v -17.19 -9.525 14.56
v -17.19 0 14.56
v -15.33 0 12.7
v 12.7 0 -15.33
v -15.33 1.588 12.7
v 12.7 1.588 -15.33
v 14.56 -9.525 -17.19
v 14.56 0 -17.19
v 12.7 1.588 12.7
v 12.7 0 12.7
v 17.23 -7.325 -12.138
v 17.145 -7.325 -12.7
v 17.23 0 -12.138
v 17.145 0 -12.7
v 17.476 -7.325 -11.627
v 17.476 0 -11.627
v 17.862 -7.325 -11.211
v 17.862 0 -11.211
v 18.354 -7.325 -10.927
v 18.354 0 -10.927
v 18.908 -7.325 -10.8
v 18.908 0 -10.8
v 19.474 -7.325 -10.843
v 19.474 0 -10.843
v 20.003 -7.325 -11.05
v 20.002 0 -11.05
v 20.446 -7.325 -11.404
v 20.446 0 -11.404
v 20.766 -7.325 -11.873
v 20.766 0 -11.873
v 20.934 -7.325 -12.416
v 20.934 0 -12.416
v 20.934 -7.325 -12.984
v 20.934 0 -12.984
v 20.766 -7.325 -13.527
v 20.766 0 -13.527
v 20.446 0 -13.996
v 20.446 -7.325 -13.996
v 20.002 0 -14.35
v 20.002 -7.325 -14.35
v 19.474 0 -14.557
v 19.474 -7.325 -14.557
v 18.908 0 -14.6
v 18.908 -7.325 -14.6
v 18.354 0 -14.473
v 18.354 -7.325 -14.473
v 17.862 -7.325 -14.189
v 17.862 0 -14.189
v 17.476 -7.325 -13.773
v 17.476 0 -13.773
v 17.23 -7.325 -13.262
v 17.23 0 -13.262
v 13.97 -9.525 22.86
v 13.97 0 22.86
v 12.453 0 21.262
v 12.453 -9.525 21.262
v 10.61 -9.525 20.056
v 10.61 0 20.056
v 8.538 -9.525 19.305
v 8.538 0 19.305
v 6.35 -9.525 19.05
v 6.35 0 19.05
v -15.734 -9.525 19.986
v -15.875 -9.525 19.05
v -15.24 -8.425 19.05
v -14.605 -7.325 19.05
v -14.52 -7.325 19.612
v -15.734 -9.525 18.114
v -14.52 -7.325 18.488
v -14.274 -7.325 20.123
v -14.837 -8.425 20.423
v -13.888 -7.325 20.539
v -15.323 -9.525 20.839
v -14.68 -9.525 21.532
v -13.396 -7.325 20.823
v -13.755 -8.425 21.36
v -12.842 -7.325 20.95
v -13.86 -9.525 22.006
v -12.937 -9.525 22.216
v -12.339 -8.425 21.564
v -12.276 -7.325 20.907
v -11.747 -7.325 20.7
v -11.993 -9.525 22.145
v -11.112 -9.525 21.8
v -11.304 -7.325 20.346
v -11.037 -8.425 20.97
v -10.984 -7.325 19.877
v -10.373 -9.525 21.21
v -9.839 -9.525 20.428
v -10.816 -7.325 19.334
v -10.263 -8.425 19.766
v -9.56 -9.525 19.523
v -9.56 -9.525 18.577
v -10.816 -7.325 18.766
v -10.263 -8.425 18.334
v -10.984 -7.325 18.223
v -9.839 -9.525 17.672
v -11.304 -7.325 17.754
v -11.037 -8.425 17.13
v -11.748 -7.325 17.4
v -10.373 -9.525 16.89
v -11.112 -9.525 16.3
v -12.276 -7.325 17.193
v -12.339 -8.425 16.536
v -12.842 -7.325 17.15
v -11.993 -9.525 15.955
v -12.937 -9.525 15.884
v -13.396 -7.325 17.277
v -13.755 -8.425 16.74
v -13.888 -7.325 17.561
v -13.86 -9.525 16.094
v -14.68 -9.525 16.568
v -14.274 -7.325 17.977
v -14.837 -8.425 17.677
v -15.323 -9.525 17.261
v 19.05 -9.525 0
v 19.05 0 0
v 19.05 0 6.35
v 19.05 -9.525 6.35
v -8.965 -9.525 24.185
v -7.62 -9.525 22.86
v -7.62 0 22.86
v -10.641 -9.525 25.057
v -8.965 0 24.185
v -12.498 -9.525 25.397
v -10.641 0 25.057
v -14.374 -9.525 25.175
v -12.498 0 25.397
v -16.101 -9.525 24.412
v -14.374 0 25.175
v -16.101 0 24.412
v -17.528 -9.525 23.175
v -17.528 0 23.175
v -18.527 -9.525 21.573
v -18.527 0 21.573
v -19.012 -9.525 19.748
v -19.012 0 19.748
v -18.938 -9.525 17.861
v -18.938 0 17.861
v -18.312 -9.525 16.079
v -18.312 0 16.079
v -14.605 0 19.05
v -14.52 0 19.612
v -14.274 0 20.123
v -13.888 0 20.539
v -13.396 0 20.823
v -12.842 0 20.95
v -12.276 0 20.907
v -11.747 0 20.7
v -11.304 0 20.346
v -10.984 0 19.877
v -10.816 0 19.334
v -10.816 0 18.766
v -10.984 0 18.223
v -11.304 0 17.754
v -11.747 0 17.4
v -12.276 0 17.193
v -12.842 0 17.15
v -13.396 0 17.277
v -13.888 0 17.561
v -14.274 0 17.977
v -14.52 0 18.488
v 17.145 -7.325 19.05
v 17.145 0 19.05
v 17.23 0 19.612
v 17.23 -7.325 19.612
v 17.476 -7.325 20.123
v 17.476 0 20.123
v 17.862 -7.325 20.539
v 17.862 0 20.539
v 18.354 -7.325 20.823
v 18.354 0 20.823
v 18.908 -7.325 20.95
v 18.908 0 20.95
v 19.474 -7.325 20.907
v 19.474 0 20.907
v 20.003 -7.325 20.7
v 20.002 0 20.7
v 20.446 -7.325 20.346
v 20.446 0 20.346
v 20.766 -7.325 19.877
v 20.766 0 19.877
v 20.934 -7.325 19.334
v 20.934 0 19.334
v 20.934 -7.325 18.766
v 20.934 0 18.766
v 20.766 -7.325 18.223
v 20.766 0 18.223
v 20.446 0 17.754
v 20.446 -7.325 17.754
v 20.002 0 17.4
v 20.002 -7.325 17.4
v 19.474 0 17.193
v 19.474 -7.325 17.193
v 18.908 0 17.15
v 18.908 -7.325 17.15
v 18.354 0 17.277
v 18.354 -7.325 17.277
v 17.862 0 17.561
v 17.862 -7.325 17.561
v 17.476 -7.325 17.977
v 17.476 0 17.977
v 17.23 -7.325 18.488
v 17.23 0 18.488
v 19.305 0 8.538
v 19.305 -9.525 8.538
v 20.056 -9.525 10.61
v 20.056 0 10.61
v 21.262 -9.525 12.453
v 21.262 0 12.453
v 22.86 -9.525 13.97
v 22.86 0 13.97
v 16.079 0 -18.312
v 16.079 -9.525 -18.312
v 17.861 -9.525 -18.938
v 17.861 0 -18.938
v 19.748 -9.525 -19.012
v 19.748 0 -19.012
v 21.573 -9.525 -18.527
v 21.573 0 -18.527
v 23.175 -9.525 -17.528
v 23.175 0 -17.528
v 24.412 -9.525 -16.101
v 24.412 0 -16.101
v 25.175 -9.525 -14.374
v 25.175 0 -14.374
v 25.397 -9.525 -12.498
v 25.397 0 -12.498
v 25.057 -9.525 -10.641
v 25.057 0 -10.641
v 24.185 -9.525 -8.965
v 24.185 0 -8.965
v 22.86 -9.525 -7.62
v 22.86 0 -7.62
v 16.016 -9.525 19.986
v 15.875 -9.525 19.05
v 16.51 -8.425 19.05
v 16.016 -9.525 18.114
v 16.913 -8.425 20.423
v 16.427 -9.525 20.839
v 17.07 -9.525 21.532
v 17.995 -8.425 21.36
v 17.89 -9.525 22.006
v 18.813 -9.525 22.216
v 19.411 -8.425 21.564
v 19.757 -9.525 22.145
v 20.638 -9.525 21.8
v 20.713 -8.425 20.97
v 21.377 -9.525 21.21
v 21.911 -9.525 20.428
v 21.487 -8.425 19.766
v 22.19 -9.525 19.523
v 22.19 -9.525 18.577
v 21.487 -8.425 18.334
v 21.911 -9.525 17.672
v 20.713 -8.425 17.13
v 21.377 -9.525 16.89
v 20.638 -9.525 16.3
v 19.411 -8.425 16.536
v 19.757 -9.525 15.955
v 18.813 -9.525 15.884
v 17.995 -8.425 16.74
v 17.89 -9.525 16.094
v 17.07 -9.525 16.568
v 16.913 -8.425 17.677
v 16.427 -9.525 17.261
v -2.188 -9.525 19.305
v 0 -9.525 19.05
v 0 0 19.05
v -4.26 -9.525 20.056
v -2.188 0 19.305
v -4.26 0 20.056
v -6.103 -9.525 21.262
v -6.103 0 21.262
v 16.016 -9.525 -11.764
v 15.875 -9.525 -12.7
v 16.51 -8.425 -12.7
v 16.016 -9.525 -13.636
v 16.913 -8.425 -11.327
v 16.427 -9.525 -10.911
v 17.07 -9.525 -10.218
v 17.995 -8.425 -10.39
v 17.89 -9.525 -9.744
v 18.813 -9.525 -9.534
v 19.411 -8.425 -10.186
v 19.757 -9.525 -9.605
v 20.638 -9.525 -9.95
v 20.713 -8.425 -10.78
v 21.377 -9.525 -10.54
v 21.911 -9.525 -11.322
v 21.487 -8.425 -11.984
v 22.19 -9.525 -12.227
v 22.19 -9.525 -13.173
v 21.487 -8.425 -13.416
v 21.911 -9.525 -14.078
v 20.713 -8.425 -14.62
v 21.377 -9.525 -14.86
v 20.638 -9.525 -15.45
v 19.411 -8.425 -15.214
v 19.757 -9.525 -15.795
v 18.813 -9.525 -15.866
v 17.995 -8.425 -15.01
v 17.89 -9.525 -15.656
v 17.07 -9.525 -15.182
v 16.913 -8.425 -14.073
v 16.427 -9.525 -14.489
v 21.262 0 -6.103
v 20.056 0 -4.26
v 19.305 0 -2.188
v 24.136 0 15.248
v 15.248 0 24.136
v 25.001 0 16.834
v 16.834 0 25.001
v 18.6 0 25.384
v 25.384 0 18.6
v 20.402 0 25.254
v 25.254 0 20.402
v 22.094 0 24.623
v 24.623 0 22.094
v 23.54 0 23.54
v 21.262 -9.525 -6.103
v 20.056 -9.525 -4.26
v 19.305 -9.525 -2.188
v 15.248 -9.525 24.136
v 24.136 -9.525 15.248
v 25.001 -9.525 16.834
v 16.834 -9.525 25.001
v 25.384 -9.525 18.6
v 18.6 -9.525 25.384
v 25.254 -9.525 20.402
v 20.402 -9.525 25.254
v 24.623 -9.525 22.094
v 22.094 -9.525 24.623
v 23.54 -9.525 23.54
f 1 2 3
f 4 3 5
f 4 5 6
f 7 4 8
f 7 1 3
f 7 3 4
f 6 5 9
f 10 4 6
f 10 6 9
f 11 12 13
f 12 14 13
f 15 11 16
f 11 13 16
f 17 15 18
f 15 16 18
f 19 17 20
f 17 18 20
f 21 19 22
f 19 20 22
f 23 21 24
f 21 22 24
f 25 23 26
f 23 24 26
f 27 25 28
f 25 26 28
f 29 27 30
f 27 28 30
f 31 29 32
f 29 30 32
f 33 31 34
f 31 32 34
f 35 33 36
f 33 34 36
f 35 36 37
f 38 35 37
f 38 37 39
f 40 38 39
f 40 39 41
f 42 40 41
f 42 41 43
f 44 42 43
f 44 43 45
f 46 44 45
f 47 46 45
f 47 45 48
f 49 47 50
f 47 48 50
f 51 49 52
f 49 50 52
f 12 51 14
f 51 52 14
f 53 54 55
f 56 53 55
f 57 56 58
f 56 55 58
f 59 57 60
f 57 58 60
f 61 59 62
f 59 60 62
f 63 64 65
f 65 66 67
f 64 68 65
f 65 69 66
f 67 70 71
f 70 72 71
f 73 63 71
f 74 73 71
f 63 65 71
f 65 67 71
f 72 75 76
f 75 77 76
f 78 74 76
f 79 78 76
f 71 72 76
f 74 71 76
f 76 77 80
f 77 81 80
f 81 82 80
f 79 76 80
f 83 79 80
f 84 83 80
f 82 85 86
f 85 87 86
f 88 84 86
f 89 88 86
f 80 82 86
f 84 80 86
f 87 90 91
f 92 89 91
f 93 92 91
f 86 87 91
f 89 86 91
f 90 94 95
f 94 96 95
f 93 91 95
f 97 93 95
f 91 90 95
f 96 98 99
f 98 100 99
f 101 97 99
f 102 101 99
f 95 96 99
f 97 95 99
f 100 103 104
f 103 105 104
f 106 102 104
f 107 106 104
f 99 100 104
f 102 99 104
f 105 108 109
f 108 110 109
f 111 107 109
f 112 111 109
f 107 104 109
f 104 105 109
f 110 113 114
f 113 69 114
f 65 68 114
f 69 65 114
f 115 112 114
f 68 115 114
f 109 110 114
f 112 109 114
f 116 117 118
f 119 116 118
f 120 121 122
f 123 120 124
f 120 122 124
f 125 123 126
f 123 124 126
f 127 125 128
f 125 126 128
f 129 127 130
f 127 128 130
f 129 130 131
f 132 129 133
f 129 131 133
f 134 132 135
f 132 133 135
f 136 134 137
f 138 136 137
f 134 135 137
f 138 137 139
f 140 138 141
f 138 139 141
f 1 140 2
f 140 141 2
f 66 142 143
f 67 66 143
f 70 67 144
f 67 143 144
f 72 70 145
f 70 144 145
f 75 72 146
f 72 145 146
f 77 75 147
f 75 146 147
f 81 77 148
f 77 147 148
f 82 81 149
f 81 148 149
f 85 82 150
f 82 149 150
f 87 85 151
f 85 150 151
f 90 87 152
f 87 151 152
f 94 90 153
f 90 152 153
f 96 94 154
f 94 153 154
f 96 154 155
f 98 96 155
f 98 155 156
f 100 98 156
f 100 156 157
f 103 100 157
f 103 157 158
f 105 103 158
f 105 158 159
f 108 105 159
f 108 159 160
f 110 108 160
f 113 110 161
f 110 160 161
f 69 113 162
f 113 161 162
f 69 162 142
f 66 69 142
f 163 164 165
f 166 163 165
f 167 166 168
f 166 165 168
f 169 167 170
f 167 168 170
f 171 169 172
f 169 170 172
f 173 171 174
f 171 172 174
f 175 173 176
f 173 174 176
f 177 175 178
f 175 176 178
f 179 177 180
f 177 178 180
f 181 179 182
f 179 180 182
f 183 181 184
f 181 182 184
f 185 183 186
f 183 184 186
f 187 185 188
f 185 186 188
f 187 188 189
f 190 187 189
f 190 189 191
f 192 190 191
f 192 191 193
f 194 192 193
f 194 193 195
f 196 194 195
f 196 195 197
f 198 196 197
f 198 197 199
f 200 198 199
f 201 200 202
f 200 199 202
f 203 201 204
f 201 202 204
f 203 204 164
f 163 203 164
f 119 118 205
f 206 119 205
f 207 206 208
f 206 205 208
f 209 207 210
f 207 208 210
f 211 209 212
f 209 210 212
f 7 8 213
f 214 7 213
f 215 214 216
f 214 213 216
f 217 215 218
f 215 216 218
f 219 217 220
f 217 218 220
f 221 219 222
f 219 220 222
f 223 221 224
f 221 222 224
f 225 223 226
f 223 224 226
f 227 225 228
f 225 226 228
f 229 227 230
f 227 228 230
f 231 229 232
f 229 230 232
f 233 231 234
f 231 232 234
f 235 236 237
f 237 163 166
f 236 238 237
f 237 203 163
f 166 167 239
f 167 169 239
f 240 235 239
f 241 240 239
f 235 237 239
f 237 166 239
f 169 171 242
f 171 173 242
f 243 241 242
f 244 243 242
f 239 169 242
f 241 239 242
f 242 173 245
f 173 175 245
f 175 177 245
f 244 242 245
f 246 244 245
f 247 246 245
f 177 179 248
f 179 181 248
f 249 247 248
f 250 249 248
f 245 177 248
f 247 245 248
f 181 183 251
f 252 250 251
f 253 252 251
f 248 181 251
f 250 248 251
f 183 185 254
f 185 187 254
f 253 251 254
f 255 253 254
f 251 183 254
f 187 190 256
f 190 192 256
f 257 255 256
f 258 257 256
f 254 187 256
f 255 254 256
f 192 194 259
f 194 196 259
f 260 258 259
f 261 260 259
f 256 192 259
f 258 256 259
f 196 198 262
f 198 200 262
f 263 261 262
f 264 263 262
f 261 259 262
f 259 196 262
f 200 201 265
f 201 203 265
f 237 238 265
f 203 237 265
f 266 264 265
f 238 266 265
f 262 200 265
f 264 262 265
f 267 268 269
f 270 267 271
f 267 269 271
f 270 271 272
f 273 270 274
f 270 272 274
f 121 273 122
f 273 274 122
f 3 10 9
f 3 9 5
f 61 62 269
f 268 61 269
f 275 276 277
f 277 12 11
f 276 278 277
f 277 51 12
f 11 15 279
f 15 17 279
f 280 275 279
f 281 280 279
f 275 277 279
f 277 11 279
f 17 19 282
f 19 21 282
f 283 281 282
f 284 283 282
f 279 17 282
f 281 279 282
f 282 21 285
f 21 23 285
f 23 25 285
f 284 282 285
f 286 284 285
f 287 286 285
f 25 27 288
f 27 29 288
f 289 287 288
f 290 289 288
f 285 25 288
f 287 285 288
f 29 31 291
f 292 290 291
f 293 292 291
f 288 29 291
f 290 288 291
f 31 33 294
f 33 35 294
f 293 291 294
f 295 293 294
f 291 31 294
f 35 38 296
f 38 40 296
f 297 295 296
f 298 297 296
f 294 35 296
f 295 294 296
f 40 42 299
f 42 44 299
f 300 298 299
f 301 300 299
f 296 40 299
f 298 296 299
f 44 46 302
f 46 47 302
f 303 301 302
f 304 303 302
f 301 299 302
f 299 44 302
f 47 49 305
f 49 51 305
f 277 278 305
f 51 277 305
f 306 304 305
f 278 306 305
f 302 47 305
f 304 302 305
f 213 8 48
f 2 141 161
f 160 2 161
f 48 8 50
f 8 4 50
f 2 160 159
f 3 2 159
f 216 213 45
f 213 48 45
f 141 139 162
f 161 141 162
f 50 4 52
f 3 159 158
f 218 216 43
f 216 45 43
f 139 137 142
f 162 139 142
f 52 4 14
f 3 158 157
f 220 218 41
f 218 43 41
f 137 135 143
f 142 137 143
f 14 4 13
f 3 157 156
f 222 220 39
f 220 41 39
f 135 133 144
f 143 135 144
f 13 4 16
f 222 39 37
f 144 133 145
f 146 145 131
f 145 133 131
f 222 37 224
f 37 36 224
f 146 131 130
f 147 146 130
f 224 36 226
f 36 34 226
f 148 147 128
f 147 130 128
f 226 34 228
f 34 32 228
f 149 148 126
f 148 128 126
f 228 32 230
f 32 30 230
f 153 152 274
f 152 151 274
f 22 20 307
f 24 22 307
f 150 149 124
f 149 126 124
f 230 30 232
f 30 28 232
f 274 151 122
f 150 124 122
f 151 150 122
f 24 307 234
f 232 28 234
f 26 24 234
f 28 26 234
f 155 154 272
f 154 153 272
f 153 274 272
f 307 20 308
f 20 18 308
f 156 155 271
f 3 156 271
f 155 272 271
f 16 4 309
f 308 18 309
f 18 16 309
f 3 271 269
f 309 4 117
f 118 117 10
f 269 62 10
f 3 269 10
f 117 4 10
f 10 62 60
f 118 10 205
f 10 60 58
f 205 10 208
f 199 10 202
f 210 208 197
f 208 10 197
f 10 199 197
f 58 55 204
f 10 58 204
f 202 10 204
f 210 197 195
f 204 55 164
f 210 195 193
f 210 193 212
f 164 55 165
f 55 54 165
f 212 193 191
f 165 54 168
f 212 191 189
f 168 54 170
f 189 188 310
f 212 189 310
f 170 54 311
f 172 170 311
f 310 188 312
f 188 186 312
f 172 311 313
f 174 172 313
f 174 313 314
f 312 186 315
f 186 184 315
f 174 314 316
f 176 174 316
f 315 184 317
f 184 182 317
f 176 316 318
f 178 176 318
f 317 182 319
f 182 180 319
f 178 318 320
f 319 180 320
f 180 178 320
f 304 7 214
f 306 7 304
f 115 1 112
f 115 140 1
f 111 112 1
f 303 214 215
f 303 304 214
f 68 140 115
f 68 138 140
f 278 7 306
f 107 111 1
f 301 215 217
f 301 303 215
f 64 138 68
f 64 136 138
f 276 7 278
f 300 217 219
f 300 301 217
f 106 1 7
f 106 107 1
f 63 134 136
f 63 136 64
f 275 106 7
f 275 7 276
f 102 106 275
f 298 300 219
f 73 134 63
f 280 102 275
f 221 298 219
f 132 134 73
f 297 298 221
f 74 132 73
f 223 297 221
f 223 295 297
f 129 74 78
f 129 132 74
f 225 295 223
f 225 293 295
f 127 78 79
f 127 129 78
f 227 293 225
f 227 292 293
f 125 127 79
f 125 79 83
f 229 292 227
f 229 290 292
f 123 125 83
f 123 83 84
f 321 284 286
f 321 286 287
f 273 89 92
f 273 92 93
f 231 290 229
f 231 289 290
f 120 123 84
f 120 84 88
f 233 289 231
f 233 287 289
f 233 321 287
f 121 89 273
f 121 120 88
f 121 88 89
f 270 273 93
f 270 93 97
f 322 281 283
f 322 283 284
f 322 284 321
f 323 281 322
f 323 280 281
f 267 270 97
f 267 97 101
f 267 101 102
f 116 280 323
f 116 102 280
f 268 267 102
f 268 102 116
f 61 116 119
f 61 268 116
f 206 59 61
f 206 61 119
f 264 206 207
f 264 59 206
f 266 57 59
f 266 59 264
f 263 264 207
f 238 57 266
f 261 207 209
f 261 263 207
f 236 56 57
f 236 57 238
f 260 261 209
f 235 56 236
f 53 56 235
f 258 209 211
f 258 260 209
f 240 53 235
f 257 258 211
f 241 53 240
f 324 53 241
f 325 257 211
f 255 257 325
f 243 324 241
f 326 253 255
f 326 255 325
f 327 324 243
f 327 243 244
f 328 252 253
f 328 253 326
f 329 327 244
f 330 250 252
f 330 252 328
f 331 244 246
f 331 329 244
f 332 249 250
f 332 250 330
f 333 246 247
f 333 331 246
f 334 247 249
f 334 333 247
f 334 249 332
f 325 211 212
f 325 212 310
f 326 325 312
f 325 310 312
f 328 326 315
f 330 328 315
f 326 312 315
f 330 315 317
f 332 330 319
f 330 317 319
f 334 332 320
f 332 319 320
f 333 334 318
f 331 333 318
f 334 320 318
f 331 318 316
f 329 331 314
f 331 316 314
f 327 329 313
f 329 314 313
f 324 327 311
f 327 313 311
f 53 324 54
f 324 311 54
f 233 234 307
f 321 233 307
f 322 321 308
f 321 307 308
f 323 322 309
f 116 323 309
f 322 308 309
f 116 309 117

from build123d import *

# Parameters (mm, degrees)
F1_DEPTH       = 9.525
F3_D           = 3.81
F3_CSINK_D     = 6.35
F3_CSINK_ANGLE = 60
F5_DEPTH       = 9.525
F5_DEPTH_BACK  = 1.5875
F7_DEPTH       = 25.4


with BuildPart() as f1:
    # F0 (on Front) → F1 (new body)
    with BuildSketch(Plane.XZ):
        with BuildLine():
            ThreePointArc((0, 19.05), (-4.259709, 20.055581), (-7.62, 22.86))
            ThreePointArc((-7.62, 22.86), (-18.379613, 21.889806), (-12.7, 12.7))
            Line((-12.7, 12.7), (12.7, 12.7))
            Line((12.7, 12.7), (12.7, -12.7))
            ThreePointArc((12.7, -12.7), (21.889806, -18.379613), (22.86, -7.62))
            ThreePointArc((22.86, -7.62), (20.055581, -4.259709), (19.05, 0))
            Line((19.05, 0), (19.05, 6.35))
            ThreePointArc((19.05, 6.35), (20.055581, 10.609709), (22.86, 13.97))
            ThreePointArc((22.86, 13.97), (23.540128, 23.540128), (13.97, 22.86))
            ThreePointArc((13.97, 22.86), (10.609709, 20.055581), (6.35, 19.05))
            Line((6.35, 19.05), (0, 19.05))
        make_face()
    extrude(amount=F1_DEPTH)

    # F3 (through all)
    with Locations(Plane.XZ.offset(9.525)):
        with Locations((-12.7, 19.05), (19.05, 19.05), (19.05, -12.7)):
            CounterSinkHole(F3_D / 2, F3_CSINK_D / 2, counter_sink_angle=F3_CSINK_ANGLE)

    # F4 (on Front) → F5 (join, two sides)
    with BuildSketch(Plane.XZ) as f5_sk:
        with BuildLine():
            Line((12.7, -12.7), (12.7, 12.7))
            Line((12.7, 12.7), (-12.7, 12.7))
            ThreePointArc((-12.7, 12.7), (-15.13004, 13.183365), (-17.190128, 14.559872))
            Line((-17.190128, 14.559872), (14.559872, -17.190128))
            ThreePointArc((14.559872, -17.190128), (13.183365, -15.13004), (12.7, -12.7))
        make_face()
    extrude(amount=F5_DEPTH)
    extrude(f5_sk.sketch, amount=-F5_DEPTH_BACK)

    # F6 (on face) → F7 (cut)
    with BuildSketch(Plane(origin=(0, 0, 0), x_dir=(-1, 0, 0), z_dir=(0, 1, 0))):
        Polygon((-12.7, -24.797732), (-12.7, -12.7), (-12.7, 12.7), (12.7, 12.7), (24.978289, 12.7), (24.821575, 21.179355), (-31.780545, 20.13324), (-31.780545, -24.797732), align=None)
    extrude(amount=F7_DEPTH, mode=Mode.SUBTRACT)


solid = f1.part
